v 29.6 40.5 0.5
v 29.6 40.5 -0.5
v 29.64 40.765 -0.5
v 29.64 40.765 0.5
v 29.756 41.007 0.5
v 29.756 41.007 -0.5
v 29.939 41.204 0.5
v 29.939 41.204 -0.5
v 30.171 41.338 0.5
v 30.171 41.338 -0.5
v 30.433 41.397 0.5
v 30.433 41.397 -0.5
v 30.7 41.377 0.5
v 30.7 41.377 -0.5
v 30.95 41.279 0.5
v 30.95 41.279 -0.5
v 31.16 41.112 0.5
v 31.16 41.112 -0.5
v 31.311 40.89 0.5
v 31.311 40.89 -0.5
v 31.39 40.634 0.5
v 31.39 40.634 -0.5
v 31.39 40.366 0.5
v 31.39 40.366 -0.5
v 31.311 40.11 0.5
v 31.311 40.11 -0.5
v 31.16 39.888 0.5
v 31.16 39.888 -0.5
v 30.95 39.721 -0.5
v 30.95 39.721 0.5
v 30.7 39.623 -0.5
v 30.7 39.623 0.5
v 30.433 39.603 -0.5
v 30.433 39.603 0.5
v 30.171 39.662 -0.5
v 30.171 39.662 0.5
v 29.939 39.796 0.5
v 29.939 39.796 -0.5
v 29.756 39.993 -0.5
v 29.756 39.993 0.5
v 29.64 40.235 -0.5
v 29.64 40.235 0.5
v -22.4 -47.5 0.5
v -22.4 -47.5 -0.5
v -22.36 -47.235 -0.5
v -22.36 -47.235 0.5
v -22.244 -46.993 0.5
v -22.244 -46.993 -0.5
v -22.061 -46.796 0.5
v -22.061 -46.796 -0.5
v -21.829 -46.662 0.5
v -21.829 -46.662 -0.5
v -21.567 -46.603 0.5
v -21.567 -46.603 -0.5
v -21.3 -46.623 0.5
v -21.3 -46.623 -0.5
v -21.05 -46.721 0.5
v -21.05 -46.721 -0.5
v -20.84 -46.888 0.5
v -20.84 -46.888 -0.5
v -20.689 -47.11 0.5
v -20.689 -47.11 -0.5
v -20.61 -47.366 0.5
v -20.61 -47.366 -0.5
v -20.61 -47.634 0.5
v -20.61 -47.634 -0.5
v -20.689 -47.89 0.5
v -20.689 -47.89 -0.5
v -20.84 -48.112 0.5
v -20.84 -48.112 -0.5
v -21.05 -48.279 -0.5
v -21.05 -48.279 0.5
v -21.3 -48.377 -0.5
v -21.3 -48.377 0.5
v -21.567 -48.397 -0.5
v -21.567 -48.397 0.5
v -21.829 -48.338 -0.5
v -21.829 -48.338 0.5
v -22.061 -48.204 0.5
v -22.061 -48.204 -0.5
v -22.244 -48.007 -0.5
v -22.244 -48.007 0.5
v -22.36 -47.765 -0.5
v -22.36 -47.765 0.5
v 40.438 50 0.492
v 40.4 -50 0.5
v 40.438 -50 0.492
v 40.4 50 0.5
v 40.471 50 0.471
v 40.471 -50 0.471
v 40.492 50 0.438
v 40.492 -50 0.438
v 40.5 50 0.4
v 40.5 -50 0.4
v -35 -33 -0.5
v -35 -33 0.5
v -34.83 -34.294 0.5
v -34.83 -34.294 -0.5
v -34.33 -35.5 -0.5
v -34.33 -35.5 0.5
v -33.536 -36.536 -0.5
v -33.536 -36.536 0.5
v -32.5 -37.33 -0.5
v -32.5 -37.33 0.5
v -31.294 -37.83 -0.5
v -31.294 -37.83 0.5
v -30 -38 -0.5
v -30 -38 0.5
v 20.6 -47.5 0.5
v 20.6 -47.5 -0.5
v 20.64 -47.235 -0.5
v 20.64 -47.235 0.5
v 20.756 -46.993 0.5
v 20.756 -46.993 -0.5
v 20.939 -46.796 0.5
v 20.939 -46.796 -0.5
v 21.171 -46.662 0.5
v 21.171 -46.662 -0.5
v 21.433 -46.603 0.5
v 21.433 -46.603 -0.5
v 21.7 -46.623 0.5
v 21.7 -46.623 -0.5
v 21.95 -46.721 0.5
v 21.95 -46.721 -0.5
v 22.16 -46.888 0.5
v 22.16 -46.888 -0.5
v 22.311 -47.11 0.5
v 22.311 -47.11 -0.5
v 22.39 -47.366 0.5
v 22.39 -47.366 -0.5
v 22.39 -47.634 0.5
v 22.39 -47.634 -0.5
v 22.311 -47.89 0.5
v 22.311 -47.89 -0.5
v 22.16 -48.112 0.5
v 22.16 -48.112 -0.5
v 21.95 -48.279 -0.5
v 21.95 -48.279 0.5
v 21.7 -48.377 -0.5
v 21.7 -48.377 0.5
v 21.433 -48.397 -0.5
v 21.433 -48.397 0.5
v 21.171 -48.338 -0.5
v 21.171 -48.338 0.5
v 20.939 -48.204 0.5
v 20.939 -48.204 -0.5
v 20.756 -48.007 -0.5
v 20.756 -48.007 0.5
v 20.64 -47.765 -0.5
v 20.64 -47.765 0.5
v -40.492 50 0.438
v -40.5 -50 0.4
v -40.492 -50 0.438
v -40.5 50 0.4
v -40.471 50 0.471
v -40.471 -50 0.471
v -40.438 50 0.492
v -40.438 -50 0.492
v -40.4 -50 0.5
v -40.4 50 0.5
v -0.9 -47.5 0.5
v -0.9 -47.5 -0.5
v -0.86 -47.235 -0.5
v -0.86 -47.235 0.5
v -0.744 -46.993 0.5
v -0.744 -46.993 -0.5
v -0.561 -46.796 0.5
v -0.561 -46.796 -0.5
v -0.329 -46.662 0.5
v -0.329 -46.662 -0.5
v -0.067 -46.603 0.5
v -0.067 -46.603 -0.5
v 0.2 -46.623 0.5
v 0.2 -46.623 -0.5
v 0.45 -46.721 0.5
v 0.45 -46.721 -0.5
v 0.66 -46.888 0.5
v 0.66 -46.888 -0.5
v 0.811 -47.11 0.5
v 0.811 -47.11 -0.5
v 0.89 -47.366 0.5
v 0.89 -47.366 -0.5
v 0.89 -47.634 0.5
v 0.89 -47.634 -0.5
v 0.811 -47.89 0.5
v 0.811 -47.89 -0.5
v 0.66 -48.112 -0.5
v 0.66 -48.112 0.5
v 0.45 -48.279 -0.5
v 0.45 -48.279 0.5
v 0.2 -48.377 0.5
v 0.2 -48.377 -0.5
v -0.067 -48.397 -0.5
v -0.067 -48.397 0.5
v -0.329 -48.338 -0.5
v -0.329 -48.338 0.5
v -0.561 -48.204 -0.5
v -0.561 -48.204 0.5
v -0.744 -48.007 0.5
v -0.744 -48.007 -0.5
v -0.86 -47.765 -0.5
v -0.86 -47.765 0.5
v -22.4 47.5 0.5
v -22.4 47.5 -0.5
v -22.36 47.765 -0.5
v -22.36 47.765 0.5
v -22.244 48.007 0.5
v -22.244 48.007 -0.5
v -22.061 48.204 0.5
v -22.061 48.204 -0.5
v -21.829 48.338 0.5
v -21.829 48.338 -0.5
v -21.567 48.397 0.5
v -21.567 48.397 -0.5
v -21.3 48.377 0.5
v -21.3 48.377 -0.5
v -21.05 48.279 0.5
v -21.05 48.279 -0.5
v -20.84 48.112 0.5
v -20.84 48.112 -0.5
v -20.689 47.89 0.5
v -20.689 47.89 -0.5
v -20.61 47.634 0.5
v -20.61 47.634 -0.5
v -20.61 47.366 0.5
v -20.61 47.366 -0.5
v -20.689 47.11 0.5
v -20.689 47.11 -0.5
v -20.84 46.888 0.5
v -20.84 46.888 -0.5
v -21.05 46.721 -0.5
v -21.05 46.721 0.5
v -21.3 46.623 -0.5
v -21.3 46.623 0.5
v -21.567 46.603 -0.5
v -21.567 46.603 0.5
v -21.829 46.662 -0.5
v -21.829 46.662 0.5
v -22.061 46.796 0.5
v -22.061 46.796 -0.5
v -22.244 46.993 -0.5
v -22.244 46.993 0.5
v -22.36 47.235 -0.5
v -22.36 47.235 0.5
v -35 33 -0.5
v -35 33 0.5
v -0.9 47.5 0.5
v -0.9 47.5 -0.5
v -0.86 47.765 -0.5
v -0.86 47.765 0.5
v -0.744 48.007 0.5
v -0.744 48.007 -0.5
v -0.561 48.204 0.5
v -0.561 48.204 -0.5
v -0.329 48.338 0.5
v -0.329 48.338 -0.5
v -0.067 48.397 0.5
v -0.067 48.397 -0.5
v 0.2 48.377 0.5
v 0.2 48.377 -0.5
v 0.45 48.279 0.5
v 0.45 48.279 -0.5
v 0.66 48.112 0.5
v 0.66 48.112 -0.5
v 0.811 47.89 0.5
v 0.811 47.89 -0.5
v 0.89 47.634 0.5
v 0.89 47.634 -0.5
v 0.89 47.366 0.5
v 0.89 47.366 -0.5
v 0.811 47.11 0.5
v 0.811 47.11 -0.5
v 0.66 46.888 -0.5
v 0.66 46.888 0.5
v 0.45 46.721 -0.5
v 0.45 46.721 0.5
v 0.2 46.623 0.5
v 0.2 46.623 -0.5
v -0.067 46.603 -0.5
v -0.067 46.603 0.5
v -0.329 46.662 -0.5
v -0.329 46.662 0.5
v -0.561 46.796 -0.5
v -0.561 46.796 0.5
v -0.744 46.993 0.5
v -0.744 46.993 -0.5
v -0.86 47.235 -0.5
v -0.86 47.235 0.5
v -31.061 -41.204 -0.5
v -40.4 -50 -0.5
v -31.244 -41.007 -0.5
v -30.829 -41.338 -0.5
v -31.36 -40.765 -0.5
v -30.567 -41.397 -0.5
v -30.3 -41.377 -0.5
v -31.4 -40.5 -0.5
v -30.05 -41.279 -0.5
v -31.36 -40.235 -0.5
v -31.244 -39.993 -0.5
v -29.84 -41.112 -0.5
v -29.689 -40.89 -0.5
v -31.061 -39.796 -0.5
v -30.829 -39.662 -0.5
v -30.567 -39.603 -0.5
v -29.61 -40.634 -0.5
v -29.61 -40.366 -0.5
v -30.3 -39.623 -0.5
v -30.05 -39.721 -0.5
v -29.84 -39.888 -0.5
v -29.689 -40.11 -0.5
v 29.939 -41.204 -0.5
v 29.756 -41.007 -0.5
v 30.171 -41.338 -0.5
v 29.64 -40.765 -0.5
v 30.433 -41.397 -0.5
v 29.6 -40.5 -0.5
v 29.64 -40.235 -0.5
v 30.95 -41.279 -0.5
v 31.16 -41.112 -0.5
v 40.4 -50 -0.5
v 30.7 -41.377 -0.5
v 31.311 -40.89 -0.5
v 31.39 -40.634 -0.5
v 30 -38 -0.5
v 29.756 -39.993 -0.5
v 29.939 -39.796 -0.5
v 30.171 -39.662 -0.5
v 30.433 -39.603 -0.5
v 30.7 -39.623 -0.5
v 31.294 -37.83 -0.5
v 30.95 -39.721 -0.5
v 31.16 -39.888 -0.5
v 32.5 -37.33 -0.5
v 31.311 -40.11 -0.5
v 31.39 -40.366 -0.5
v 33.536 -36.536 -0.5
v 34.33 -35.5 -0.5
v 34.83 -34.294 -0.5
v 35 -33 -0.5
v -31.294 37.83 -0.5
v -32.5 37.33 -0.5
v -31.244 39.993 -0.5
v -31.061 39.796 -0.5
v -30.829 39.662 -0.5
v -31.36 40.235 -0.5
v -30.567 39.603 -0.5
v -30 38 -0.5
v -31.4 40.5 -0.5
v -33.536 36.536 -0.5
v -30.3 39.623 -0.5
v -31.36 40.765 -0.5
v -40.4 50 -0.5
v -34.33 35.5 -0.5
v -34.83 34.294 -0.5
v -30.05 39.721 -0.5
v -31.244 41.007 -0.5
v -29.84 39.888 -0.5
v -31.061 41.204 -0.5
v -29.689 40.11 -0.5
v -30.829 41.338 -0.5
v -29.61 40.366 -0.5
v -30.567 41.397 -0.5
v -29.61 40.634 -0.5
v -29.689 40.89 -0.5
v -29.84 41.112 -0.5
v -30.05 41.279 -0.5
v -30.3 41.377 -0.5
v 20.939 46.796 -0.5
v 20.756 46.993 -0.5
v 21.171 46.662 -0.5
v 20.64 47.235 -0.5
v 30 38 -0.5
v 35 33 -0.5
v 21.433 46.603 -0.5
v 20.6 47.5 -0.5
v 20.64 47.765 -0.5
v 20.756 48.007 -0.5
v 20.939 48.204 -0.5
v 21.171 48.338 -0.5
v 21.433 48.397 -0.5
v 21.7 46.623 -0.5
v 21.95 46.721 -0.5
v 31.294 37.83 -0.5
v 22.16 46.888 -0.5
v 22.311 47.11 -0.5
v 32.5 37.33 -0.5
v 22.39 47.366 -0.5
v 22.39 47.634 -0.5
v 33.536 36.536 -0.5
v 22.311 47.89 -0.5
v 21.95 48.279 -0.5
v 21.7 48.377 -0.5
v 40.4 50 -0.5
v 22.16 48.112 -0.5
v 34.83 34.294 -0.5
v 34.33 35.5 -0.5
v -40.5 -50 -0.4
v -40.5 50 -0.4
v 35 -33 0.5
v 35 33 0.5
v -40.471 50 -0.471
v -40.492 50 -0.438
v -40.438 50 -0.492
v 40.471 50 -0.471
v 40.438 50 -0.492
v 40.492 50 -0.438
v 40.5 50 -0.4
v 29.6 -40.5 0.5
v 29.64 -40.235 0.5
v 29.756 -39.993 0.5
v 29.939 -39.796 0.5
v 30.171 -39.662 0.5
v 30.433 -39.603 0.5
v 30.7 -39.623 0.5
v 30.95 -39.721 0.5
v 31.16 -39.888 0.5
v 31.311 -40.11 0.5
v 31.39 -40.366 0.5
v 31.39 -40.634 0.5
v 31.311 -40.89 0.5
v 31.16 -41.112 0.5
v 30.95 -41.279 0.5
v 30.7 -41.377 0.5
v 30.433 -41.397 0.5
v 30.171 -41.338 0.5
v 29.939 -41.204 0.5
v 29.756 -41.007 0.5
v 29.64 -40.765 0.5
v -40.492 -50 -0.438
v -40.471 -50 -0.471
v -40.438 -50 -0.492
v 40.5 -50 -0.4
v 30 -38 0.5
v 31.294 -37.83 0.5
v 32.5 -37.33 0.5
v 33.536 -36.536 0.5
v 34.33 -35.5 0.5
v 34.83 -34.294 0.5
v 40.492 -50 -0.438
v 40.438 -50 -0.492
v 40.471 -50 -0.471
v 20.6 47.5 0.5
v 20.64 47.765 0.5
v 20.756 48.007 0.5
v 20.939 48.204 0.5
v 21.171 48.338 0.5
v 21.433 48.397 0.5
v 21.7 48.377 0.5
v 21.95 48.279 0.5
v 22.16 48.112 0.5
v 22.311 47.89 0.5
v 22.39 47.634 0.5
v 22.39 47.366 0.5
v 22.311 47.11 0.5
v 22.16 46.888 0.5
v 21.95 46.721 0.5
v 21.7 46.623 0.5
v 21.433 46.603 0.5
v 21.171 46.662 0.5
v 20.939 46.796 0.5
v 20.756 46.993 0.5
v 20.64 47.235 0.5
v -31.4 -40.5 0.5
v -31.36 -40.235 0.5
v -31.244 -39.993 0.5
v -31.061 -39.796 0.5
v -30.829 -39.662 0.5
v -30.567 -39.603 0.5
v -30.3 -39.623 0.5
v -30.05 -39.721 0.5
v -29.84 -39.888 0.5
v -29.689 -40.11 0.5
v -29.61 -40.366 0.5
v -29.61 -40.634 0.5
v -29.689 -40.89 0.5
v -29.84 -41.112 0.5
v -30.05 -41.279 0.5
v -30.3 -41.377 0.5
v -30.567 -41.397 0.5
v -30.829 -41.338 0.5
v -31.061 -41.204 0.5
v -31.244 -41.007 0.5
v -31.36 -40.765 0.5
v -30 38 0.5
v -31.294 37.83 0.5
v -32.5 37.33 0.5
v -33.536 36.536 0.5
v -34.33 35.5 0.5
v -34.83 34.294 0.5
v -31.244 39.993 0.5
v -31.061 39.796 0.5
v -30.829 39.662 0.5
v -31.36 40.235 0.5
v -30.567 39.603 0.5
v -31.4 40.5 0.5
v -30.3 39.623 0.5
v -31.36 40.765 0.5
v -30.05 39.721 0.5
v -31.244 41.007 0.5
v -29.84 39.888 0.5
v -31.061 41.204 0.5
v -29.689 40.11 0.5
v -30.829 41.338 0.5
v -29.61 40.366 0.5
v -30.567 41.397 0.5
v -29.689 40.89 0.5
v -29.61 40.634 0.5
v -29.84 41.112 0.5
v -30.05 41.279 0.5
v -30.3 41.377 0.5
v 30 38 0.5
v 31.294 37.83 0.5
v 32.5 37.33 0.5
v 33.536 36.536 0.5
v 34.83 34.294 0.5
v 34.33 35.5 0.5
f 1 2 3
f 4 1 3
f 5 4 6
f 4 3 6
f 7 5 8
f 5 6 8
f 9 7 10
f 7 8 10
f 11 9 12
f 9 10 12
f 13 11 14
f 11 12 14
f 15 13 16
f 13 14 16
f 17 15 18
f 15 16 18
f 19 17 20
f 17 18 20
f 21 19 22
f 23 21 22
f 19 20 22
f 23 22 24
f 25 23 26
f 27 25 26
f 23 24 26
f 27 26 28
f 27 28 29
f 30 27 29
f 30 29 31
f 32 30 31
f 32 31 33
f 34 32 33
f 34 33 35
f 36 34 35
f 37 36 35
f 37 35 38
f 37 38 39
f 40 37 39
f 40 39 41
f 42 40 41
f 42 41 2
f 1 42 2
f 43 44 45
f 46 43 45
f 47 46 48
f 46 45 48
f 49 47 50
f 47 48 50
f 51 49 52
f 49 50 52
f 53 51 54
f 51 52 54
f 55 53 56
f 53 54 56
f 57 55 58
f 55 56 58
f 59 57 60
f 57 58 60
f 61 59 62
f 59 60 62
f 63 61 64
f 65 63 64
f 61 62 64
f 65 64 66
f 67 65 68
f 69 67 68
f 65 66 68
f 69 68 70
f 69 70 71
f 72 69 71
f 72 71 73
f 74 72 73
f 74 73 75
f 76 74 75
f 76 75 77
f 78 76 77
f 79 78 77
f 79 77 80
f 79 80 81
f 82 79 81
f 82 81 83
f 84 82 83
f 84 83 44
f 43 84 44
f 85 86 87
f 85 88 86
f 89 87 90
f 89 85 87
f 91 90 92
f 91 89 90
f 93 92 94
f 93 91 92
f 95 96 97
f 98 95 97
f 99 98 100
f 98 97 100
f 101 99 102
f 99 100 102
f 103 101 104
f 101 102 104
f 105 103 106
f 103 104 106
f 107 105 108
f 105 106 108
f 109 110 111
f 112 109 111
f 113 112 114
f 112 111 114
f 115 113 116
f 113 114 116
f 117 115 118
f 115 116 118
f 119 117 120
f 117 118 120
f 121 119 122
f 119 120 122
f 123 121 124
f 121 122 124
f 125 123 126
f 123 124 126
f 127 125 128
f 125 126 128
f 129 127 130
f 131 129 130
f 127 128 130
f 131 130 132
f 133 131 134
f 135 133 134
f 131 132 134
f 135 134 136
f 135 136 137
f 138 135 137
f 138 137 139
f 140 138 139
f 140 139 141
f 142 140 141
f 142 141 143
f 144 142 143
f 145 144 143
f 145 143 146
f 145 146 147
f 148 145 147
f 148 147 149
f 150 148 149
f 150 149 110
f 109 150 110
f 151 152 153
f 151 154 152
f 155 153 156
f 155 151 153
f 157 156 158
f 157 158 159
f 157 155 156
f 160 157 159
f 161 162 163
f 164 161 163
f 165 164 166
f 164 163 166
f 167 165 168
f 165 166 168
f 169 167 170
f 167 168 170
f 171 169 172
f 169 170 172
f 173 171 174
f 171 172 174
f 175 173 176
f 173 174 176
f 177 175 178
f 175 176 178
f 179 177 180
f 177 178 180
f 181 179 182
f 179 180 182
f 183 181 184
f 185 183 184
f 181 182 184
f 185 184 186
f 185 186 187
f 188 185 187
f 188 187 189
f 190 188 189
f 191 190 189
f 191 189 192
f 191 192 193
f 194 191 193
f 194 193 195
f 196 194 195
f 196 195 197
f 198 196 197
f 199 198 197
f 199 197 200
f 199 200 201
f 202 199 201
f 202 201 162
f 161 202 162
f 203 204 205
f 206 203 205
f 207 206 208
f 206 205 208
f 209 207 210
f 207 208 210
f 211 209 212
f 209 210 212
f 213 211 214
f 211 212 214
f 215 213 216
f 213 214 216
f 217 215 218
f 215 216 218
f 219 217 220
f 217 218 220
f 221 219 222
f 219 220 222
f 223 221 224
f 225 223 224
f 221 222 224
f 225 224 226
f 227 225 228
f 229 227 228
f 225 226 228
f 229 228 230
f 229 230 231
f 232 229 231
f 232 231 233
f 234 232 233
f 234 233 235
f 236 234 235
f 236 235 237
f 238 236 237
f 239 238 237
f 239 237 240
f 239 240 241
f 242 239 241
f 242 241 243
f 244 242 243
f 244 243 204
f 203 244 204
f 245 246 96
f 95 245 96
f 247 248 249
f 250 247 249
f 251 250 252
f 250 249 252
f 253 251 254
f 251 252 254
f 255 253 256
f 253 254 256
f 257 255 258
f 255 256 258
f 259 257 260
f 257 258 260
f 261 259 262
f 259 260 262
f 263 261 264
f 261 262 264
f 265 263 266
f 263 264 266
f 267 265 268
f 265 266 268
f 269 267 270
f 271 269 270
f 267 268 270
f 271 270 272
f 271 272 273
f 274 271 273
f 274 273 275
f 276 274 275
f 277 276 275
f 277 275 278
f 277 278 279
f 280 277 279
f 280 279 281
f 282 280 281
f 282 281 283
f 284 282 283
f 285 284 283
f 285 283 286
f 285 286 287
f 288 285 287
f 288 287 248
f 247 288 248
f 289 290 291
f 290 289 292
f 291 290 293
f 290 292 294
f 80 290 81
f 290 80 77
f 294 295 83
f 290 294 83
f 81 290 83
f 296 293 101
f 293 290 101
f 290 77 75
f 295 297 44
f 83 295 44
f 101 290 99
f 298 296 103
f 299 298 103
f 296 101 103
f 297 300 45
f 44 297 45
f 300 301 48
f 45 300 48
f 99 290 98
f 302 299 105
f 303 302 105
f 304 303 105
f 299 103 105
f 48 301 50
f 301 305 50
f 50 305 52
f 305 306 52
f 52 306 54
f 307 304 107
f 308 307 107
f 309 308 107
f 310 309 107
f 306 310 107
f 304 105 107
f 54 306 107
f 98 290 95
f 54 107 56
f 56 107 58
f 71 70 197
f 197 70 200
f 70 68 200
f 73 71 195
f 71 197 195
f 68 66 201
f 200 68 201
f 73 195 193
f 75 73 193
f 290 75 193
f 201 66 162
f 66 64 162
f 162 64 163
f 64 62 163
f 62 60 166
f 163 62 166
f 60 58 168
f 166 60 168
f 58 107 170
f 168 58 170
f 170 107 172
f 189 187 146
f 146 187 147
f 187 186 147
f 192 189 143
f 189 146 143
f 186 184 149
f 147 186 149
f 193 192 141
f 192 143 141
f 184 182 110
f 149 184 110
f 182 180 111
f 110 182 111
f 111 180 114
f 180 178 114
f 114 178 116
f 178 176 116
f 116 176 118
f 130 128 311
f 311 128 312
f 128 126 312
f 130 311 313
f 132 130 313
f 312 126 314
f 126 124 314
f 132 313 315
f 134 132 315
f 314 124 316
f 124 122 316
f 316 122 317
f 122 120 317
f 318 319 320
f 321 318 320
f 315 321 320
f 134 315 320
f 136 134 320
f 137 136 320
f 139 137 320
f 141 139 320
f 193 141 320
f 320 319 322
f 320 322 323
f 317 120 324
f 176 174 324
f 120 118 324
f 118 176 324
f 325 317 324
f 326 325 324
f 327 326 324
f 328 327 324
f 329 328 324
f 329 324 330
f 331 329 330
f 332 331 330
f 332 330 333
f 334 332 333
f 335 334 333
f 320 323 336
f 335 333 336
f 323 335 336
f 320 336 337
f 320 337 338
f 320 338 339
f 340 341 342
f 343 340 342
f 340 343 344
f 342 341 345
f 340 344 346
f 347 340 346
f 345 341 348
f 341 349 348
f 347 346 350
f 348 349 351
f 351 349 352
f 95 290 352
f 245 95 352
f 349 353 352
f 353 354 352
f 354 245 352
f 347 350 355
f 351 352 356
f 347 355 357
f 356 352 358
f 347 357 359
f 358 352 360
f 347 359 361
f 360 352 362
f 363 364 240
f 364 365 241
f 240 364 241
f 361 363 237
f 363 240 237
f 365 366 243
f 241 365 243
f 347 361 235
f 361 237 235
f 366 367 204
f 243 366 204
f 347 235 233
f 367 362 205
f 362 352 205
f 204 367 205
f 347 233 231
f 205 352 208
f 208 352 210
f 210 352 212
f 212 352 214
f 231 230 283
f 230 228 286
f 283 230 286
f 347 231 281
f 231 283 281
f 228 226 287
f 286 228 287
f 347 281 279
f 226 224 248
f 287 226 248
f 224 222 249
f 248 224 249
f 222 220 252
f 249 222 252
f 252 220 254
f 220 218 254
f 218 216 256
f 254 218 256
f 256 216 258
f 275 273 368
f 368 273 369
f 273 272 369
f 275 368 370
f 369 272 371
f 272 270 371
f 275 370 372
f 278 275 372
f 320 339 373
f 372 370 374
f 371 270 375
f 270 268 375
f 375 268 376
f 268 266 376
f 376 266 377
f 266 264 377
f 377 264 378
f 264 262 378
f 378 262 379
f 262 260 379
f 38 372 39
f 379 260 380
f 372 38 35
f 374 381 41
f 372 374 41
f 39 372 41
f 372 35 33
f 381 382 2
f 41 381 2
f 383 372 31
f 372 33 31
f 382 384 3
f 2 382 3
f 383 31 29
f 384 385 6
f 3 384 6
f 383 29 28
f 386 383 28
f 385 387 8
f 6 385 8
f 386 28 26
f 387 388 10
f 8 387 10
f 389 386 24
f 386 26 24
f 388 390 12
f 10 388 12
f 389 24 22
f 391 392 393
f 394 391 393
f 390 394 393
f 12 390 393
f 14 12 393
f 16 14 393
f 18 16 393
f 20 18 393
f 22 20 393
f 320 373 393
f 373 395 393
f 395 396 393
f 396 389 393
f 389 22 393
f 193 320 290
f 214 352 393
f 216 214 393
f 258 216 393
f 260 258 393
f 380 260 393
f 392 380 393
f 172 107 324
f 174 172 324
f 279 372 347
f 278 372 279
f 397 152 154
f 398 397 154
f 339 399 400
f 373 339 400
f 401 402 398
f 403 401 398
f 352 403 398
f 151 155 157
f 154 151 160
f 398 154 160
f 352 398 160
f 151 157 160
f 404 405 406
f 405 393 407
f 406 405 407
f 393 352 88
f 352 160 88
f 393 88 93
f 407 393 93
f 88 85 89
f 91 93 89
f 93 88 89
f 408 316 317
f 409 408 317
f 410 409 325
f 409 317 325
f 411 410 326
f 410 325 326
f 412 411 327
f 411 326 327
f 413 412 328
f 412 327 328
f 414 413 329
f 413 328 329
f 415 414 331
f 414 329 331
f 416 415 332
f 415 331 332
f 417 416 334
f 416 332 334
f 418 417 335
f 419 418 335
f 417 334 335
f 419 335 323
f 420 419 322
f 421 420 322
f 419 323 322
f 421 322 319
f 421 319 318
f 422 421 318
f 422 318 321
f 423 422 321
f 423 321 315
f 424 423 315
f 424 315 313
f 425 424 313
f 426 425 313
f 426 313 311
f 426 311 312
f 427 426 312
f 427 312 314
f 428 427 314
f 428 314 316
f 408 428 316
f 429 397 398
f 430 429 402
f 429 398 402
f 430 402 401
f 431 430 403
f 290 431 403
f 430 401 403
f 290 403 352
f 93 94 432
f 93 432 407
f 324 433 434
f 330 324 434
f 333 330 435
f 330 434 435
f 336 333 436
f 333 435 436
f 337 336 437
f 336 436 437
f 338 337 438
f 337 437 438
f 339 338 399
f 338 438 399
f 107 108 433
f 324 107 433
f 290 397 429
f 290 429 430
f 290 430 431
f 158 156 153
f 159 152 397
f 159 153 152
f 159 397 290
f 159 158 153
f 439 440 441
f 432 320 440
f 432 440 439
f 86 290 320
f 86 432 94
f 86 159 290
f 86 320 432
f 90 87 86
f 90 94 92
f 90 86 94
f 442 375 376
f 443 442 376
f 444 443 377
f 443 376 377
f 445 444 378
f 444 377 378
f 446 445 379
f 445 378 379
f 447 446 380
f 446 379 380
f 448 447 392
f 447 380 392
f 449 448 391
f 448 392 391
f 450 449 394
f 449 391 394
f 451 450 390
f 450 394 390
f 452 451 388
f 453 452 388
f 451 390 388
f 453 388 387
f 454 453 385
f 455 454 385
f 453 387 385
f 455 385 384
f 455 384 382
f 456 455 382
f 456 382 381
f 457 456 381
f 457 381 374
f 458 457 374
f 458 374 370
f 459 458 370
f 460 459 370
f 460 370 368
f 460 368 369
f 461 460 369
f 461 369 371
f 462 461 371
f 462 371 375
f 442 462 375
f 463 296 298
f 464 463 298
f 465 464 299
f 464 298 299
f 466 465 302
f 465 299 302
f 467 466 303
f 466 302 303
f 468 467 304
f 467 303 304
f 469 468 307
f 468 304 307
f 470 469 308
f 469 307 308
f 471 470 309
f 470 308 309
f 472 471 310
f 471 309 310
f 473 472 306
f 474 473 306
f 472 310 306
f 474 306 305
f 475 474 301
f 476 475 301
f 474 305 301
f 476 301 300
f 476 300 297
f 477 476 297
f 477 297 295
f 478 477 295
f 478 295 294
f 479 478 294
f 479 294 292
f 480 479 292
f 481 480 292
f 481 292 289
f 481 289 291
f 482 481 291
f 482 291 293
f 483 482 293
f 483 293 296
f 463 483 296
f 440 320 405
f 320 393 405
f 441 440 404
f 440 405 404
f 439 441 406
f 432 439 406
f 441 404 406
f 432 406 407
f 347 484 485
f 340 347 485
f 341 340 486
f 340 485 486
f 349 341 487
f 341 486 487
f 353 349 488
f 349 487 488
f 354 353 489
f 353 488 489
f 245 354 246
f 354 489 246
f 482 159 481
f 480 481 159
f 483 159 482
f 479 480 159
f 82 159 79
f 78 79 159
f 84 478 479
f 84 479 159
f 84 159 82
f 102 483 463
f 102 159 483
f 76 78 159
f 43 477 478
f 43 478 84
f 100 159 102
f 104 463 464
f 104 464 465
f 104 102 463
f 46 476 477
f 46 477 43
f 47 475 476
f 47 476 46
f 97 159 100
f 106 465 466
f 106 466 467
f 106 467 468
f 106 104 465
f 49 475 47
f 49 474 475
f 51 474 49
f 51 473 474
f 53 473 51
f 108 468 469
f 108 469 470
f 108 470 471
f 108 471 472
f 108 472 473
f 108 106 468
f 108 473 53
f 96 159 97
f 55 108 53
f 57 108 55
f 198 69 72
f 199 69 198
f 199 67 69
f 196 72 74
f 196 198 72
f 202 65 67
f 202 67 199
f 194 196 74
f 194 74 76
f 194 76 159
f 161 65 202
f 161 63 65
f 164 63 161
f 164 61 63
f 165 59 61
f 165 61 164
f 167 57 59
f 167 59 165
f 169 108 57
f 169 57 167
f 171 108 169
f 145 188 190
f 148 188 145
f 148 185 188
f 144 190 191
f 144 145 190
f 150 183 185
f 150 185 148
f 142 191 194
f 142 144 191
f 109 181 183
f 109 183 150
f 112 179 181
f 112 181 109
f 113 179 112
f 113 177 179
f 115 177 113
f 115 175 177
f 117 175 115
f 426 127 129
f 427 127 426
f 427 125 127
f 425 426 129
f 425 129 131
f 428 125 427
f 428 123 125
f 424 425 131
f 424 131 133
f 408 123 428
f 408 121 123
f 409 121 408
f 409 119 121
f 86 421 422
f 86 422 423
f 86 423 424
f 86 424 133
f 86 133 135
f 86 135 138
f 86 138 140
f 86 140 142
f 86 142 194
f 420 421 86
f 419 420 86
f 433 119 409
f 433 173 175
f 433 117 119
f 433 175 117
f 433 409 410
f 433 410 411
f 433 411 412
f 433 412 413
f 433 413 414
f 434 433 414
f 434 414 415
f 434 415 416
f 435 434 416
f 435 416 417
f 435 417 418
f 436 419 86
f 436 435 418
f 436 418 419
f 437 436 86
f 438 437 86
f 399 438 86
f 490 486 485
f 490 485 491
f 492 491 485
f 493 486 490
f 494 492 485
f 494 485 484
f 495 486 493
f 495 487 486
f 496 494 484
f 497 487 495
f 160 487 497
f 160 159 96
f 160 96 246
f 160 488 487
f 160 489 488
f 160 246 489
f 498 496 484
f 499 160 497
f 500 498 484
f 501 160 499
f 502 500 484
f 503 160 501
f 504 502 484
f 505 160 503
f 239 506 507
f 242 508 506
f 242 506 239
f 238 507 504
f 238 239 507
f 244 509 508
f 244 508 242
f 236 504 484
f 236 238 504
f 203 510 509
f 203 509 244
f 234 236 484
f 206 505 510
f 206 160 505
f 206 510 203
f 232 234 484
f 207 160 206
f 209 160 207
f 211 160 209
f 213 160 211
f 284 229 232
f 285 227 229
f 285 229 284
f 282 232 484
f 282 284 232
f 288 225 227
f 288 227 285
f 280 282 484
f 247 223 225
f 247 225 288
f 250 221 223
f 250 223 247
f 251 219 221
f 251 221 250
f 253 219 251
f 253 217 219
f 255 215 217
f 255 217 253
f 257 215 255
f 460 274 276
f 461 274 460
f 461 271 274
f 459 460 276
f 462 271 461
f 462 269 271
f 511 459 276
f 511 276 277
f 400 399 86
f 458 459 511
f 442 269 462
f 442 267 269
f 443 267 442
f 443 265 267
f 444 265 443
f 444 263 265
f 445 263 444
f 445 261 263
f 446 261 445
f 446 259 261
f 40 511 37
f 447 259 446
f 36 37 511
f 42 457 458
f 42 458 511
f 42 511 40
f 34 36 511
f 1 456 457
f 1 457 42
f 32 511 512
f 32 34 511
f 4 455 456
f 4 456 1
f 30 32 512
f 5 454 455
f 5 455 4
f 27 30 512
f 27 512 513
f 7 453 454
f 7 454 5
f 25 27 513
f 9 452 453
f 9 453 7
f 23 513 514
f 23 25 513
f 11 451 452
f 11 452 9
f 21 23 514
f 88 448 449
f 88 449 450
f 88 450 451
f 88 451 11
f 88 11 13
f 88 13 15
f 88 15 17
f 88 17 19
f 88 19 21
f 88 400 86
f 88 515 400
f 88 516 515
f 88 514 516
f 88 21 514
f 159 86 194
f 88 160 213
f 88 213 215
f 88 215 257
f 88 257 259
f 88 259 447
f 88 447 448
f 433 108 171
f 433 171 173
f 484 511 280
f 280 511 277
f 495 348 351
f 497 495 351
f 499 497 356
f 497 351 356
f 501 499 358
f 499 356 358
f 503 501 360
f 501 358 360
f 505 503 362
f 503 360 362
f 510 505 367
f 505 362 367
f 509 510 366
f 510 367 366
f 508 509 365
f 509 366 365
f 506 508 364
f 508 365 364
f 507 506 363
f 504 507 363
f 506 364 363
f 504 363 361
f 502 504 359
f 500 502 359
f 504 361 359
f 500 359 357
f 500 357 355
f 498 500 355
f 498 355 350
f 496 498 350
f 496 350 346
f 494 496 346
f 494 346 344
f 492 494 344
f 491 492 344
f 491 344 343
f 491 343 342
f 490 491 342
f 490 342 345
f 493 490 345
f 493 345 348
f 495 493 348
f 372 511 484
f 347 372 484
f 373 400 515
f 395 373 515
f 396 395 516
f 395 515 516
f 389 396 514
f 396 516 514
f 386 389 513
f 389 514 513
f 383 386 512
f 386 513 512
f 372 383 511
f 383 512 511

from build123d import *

# Parameters (mm, degrees)
SKETCH1_W                   = 81
SKETCH1_H                   = 100
BOSS_EXTRUDE1_DEPTH         = 0.5
CUT_EXTRUDE1_DEPTH          = 65.352544627
M1_6_HOLE1_PCBUNION_D       = 1.8
M1_6_HOLE1_PCBUNION_DEPTH   = 100
M1_6_HOLE1_PCBUNION_TIP     = 0.540774557
M1_6_HOLE2_PLATEUNION_D     = 1.8
M1_6_HOLE2_PLATEUNION_DEPTH = 100
M1_6_HOLE2_PLATEUNION_TIP   = 0.540774557
M1_6_HOLE3_TOPUNION_D       = 1.8
M1_6_HOLE3_TOPUNION_DEPTH   = 200
M1_6_HOLE3_TOPUNION_TIP     = 0.540774557
FILLET1_R                   = 0.1


with BuildPart() as part:
    # Sketch1 → Boss-Extrude1 (new, symmetric)
    with BuildSketch(Plane.XY):
        Rectangle(SKETCH1_W, SKETCH1_H)
    extrude(amount=BOSS_EXTRUDE1_DEPTH, both=True)

    # Sketch2 → Cut-Extrude1 (cut, through all)
    with BuildSketch(Plane.XY.offset(0.5)):
        with BuildLine():
            Line((-30, -38), (30, -38))
            ThreePointArc((30, -38), (33.535533906, -36.535533906), (35, -33))
            Line((35, -33), (35, 33))
            ThreePointArc((35, 33), (33.535533906, 36.535533906), (30, 38))
            Line((30, 38), (-30, 38))
            ThreePointArc((-30, 38), (-33.535533906, 36.535533906), (-35, 33))
            Line((-35, 33), (-35, -33))
            ThreePointArc((-35, -33), (-33.535533906, -36.535533906), (-30, -38))
        make_face()
    extrude(amount=-CUT_EXTRUDE1_DEPTH, mode=Mode.SUBTRACT)

    # M1.6 Hole1-PCBUnion
    with Locations(Plane.XY.offset(0.5)):
        with Locations((-30.5, 40.5), (30.5, 40.5), (-30.5, -40.5), (30.5, -40.5)):
            Hole(M1_6_HOLE1_PCBUNION_D / 2, depth=M1_6_HOLE1_PCBUNION_DEPTH)
            with Locations((0, 0, -(M1_6_HOLE1_PCBUNION_DEPTH + M1_6_HOLE1_PCBUNION_TIP / 2))):  # 118° drill point
                Cone(0, M1_6_HOLE1_PCBUNION_D / 2, M1_6_HOLE1_PCBUNION_TIP, mode=Mode.SUBTRACT)

    # M1.6 Hole2-PlateUnion
    with Locations(Plane.XY.offset(0.5)):
        with Locations((-21.5, 47.5), (21.5, 47.5), (-21.5, -47.5), (21.5, -47.5)):
            Hole(M1_6_HOLE2_PLATEUNION_D / 2, depth=M1_6_HOLE2_PLATEUNION_DEPTH)
            with Locations((0, 0, -(M1_6_HOLE2_PLATEUNION_DEPTH + M1_6_HOLE2_PLATEUNION_TIP / 2))):  # 118° drill point
                Cone(0, M1_6_HOLE2_PLATEUNION_D / 2, M1_6_HOLE2_PLATEUNION_TIP, mode=Mode.SUBTRACT)

    # M1.6 Hole3-TopUnion
    with Locations(Plane.XY.offset(0.5)):
        with Locations((0, 47.5), (0, -47.5)):
            Hole(M1_6_HOLE3_TOPUNION_D / 2, depth=M1_6_HOLE3_TOPUNION_DEPTH)
            with Locations((0, 0, -(M1_6_HOLE3_TOPUNION_DEPTH + M1_6_HOLE3_TOPUNION_TIP / 2))):  # 118° drill point
                Cone(0, M1_6_HOLE3_TOPUNION_D / 2, M1_6_HOLE3_TOPUNION_TIP, mode=Mode.SUBTRACT)

    # Fillet1
    fillet1_edges = [part.edges().sort_by_distance(p)[0] for p in [
        (-40.5, 0, 0.5),
        (40.5, 0, 0.5),
        (-40.5, 0, -0.5),
        (40.5, 0, -0.5),
    ]]
    fillet(fillet1_edges, radius=FILLET1_R)


solid = part.part
